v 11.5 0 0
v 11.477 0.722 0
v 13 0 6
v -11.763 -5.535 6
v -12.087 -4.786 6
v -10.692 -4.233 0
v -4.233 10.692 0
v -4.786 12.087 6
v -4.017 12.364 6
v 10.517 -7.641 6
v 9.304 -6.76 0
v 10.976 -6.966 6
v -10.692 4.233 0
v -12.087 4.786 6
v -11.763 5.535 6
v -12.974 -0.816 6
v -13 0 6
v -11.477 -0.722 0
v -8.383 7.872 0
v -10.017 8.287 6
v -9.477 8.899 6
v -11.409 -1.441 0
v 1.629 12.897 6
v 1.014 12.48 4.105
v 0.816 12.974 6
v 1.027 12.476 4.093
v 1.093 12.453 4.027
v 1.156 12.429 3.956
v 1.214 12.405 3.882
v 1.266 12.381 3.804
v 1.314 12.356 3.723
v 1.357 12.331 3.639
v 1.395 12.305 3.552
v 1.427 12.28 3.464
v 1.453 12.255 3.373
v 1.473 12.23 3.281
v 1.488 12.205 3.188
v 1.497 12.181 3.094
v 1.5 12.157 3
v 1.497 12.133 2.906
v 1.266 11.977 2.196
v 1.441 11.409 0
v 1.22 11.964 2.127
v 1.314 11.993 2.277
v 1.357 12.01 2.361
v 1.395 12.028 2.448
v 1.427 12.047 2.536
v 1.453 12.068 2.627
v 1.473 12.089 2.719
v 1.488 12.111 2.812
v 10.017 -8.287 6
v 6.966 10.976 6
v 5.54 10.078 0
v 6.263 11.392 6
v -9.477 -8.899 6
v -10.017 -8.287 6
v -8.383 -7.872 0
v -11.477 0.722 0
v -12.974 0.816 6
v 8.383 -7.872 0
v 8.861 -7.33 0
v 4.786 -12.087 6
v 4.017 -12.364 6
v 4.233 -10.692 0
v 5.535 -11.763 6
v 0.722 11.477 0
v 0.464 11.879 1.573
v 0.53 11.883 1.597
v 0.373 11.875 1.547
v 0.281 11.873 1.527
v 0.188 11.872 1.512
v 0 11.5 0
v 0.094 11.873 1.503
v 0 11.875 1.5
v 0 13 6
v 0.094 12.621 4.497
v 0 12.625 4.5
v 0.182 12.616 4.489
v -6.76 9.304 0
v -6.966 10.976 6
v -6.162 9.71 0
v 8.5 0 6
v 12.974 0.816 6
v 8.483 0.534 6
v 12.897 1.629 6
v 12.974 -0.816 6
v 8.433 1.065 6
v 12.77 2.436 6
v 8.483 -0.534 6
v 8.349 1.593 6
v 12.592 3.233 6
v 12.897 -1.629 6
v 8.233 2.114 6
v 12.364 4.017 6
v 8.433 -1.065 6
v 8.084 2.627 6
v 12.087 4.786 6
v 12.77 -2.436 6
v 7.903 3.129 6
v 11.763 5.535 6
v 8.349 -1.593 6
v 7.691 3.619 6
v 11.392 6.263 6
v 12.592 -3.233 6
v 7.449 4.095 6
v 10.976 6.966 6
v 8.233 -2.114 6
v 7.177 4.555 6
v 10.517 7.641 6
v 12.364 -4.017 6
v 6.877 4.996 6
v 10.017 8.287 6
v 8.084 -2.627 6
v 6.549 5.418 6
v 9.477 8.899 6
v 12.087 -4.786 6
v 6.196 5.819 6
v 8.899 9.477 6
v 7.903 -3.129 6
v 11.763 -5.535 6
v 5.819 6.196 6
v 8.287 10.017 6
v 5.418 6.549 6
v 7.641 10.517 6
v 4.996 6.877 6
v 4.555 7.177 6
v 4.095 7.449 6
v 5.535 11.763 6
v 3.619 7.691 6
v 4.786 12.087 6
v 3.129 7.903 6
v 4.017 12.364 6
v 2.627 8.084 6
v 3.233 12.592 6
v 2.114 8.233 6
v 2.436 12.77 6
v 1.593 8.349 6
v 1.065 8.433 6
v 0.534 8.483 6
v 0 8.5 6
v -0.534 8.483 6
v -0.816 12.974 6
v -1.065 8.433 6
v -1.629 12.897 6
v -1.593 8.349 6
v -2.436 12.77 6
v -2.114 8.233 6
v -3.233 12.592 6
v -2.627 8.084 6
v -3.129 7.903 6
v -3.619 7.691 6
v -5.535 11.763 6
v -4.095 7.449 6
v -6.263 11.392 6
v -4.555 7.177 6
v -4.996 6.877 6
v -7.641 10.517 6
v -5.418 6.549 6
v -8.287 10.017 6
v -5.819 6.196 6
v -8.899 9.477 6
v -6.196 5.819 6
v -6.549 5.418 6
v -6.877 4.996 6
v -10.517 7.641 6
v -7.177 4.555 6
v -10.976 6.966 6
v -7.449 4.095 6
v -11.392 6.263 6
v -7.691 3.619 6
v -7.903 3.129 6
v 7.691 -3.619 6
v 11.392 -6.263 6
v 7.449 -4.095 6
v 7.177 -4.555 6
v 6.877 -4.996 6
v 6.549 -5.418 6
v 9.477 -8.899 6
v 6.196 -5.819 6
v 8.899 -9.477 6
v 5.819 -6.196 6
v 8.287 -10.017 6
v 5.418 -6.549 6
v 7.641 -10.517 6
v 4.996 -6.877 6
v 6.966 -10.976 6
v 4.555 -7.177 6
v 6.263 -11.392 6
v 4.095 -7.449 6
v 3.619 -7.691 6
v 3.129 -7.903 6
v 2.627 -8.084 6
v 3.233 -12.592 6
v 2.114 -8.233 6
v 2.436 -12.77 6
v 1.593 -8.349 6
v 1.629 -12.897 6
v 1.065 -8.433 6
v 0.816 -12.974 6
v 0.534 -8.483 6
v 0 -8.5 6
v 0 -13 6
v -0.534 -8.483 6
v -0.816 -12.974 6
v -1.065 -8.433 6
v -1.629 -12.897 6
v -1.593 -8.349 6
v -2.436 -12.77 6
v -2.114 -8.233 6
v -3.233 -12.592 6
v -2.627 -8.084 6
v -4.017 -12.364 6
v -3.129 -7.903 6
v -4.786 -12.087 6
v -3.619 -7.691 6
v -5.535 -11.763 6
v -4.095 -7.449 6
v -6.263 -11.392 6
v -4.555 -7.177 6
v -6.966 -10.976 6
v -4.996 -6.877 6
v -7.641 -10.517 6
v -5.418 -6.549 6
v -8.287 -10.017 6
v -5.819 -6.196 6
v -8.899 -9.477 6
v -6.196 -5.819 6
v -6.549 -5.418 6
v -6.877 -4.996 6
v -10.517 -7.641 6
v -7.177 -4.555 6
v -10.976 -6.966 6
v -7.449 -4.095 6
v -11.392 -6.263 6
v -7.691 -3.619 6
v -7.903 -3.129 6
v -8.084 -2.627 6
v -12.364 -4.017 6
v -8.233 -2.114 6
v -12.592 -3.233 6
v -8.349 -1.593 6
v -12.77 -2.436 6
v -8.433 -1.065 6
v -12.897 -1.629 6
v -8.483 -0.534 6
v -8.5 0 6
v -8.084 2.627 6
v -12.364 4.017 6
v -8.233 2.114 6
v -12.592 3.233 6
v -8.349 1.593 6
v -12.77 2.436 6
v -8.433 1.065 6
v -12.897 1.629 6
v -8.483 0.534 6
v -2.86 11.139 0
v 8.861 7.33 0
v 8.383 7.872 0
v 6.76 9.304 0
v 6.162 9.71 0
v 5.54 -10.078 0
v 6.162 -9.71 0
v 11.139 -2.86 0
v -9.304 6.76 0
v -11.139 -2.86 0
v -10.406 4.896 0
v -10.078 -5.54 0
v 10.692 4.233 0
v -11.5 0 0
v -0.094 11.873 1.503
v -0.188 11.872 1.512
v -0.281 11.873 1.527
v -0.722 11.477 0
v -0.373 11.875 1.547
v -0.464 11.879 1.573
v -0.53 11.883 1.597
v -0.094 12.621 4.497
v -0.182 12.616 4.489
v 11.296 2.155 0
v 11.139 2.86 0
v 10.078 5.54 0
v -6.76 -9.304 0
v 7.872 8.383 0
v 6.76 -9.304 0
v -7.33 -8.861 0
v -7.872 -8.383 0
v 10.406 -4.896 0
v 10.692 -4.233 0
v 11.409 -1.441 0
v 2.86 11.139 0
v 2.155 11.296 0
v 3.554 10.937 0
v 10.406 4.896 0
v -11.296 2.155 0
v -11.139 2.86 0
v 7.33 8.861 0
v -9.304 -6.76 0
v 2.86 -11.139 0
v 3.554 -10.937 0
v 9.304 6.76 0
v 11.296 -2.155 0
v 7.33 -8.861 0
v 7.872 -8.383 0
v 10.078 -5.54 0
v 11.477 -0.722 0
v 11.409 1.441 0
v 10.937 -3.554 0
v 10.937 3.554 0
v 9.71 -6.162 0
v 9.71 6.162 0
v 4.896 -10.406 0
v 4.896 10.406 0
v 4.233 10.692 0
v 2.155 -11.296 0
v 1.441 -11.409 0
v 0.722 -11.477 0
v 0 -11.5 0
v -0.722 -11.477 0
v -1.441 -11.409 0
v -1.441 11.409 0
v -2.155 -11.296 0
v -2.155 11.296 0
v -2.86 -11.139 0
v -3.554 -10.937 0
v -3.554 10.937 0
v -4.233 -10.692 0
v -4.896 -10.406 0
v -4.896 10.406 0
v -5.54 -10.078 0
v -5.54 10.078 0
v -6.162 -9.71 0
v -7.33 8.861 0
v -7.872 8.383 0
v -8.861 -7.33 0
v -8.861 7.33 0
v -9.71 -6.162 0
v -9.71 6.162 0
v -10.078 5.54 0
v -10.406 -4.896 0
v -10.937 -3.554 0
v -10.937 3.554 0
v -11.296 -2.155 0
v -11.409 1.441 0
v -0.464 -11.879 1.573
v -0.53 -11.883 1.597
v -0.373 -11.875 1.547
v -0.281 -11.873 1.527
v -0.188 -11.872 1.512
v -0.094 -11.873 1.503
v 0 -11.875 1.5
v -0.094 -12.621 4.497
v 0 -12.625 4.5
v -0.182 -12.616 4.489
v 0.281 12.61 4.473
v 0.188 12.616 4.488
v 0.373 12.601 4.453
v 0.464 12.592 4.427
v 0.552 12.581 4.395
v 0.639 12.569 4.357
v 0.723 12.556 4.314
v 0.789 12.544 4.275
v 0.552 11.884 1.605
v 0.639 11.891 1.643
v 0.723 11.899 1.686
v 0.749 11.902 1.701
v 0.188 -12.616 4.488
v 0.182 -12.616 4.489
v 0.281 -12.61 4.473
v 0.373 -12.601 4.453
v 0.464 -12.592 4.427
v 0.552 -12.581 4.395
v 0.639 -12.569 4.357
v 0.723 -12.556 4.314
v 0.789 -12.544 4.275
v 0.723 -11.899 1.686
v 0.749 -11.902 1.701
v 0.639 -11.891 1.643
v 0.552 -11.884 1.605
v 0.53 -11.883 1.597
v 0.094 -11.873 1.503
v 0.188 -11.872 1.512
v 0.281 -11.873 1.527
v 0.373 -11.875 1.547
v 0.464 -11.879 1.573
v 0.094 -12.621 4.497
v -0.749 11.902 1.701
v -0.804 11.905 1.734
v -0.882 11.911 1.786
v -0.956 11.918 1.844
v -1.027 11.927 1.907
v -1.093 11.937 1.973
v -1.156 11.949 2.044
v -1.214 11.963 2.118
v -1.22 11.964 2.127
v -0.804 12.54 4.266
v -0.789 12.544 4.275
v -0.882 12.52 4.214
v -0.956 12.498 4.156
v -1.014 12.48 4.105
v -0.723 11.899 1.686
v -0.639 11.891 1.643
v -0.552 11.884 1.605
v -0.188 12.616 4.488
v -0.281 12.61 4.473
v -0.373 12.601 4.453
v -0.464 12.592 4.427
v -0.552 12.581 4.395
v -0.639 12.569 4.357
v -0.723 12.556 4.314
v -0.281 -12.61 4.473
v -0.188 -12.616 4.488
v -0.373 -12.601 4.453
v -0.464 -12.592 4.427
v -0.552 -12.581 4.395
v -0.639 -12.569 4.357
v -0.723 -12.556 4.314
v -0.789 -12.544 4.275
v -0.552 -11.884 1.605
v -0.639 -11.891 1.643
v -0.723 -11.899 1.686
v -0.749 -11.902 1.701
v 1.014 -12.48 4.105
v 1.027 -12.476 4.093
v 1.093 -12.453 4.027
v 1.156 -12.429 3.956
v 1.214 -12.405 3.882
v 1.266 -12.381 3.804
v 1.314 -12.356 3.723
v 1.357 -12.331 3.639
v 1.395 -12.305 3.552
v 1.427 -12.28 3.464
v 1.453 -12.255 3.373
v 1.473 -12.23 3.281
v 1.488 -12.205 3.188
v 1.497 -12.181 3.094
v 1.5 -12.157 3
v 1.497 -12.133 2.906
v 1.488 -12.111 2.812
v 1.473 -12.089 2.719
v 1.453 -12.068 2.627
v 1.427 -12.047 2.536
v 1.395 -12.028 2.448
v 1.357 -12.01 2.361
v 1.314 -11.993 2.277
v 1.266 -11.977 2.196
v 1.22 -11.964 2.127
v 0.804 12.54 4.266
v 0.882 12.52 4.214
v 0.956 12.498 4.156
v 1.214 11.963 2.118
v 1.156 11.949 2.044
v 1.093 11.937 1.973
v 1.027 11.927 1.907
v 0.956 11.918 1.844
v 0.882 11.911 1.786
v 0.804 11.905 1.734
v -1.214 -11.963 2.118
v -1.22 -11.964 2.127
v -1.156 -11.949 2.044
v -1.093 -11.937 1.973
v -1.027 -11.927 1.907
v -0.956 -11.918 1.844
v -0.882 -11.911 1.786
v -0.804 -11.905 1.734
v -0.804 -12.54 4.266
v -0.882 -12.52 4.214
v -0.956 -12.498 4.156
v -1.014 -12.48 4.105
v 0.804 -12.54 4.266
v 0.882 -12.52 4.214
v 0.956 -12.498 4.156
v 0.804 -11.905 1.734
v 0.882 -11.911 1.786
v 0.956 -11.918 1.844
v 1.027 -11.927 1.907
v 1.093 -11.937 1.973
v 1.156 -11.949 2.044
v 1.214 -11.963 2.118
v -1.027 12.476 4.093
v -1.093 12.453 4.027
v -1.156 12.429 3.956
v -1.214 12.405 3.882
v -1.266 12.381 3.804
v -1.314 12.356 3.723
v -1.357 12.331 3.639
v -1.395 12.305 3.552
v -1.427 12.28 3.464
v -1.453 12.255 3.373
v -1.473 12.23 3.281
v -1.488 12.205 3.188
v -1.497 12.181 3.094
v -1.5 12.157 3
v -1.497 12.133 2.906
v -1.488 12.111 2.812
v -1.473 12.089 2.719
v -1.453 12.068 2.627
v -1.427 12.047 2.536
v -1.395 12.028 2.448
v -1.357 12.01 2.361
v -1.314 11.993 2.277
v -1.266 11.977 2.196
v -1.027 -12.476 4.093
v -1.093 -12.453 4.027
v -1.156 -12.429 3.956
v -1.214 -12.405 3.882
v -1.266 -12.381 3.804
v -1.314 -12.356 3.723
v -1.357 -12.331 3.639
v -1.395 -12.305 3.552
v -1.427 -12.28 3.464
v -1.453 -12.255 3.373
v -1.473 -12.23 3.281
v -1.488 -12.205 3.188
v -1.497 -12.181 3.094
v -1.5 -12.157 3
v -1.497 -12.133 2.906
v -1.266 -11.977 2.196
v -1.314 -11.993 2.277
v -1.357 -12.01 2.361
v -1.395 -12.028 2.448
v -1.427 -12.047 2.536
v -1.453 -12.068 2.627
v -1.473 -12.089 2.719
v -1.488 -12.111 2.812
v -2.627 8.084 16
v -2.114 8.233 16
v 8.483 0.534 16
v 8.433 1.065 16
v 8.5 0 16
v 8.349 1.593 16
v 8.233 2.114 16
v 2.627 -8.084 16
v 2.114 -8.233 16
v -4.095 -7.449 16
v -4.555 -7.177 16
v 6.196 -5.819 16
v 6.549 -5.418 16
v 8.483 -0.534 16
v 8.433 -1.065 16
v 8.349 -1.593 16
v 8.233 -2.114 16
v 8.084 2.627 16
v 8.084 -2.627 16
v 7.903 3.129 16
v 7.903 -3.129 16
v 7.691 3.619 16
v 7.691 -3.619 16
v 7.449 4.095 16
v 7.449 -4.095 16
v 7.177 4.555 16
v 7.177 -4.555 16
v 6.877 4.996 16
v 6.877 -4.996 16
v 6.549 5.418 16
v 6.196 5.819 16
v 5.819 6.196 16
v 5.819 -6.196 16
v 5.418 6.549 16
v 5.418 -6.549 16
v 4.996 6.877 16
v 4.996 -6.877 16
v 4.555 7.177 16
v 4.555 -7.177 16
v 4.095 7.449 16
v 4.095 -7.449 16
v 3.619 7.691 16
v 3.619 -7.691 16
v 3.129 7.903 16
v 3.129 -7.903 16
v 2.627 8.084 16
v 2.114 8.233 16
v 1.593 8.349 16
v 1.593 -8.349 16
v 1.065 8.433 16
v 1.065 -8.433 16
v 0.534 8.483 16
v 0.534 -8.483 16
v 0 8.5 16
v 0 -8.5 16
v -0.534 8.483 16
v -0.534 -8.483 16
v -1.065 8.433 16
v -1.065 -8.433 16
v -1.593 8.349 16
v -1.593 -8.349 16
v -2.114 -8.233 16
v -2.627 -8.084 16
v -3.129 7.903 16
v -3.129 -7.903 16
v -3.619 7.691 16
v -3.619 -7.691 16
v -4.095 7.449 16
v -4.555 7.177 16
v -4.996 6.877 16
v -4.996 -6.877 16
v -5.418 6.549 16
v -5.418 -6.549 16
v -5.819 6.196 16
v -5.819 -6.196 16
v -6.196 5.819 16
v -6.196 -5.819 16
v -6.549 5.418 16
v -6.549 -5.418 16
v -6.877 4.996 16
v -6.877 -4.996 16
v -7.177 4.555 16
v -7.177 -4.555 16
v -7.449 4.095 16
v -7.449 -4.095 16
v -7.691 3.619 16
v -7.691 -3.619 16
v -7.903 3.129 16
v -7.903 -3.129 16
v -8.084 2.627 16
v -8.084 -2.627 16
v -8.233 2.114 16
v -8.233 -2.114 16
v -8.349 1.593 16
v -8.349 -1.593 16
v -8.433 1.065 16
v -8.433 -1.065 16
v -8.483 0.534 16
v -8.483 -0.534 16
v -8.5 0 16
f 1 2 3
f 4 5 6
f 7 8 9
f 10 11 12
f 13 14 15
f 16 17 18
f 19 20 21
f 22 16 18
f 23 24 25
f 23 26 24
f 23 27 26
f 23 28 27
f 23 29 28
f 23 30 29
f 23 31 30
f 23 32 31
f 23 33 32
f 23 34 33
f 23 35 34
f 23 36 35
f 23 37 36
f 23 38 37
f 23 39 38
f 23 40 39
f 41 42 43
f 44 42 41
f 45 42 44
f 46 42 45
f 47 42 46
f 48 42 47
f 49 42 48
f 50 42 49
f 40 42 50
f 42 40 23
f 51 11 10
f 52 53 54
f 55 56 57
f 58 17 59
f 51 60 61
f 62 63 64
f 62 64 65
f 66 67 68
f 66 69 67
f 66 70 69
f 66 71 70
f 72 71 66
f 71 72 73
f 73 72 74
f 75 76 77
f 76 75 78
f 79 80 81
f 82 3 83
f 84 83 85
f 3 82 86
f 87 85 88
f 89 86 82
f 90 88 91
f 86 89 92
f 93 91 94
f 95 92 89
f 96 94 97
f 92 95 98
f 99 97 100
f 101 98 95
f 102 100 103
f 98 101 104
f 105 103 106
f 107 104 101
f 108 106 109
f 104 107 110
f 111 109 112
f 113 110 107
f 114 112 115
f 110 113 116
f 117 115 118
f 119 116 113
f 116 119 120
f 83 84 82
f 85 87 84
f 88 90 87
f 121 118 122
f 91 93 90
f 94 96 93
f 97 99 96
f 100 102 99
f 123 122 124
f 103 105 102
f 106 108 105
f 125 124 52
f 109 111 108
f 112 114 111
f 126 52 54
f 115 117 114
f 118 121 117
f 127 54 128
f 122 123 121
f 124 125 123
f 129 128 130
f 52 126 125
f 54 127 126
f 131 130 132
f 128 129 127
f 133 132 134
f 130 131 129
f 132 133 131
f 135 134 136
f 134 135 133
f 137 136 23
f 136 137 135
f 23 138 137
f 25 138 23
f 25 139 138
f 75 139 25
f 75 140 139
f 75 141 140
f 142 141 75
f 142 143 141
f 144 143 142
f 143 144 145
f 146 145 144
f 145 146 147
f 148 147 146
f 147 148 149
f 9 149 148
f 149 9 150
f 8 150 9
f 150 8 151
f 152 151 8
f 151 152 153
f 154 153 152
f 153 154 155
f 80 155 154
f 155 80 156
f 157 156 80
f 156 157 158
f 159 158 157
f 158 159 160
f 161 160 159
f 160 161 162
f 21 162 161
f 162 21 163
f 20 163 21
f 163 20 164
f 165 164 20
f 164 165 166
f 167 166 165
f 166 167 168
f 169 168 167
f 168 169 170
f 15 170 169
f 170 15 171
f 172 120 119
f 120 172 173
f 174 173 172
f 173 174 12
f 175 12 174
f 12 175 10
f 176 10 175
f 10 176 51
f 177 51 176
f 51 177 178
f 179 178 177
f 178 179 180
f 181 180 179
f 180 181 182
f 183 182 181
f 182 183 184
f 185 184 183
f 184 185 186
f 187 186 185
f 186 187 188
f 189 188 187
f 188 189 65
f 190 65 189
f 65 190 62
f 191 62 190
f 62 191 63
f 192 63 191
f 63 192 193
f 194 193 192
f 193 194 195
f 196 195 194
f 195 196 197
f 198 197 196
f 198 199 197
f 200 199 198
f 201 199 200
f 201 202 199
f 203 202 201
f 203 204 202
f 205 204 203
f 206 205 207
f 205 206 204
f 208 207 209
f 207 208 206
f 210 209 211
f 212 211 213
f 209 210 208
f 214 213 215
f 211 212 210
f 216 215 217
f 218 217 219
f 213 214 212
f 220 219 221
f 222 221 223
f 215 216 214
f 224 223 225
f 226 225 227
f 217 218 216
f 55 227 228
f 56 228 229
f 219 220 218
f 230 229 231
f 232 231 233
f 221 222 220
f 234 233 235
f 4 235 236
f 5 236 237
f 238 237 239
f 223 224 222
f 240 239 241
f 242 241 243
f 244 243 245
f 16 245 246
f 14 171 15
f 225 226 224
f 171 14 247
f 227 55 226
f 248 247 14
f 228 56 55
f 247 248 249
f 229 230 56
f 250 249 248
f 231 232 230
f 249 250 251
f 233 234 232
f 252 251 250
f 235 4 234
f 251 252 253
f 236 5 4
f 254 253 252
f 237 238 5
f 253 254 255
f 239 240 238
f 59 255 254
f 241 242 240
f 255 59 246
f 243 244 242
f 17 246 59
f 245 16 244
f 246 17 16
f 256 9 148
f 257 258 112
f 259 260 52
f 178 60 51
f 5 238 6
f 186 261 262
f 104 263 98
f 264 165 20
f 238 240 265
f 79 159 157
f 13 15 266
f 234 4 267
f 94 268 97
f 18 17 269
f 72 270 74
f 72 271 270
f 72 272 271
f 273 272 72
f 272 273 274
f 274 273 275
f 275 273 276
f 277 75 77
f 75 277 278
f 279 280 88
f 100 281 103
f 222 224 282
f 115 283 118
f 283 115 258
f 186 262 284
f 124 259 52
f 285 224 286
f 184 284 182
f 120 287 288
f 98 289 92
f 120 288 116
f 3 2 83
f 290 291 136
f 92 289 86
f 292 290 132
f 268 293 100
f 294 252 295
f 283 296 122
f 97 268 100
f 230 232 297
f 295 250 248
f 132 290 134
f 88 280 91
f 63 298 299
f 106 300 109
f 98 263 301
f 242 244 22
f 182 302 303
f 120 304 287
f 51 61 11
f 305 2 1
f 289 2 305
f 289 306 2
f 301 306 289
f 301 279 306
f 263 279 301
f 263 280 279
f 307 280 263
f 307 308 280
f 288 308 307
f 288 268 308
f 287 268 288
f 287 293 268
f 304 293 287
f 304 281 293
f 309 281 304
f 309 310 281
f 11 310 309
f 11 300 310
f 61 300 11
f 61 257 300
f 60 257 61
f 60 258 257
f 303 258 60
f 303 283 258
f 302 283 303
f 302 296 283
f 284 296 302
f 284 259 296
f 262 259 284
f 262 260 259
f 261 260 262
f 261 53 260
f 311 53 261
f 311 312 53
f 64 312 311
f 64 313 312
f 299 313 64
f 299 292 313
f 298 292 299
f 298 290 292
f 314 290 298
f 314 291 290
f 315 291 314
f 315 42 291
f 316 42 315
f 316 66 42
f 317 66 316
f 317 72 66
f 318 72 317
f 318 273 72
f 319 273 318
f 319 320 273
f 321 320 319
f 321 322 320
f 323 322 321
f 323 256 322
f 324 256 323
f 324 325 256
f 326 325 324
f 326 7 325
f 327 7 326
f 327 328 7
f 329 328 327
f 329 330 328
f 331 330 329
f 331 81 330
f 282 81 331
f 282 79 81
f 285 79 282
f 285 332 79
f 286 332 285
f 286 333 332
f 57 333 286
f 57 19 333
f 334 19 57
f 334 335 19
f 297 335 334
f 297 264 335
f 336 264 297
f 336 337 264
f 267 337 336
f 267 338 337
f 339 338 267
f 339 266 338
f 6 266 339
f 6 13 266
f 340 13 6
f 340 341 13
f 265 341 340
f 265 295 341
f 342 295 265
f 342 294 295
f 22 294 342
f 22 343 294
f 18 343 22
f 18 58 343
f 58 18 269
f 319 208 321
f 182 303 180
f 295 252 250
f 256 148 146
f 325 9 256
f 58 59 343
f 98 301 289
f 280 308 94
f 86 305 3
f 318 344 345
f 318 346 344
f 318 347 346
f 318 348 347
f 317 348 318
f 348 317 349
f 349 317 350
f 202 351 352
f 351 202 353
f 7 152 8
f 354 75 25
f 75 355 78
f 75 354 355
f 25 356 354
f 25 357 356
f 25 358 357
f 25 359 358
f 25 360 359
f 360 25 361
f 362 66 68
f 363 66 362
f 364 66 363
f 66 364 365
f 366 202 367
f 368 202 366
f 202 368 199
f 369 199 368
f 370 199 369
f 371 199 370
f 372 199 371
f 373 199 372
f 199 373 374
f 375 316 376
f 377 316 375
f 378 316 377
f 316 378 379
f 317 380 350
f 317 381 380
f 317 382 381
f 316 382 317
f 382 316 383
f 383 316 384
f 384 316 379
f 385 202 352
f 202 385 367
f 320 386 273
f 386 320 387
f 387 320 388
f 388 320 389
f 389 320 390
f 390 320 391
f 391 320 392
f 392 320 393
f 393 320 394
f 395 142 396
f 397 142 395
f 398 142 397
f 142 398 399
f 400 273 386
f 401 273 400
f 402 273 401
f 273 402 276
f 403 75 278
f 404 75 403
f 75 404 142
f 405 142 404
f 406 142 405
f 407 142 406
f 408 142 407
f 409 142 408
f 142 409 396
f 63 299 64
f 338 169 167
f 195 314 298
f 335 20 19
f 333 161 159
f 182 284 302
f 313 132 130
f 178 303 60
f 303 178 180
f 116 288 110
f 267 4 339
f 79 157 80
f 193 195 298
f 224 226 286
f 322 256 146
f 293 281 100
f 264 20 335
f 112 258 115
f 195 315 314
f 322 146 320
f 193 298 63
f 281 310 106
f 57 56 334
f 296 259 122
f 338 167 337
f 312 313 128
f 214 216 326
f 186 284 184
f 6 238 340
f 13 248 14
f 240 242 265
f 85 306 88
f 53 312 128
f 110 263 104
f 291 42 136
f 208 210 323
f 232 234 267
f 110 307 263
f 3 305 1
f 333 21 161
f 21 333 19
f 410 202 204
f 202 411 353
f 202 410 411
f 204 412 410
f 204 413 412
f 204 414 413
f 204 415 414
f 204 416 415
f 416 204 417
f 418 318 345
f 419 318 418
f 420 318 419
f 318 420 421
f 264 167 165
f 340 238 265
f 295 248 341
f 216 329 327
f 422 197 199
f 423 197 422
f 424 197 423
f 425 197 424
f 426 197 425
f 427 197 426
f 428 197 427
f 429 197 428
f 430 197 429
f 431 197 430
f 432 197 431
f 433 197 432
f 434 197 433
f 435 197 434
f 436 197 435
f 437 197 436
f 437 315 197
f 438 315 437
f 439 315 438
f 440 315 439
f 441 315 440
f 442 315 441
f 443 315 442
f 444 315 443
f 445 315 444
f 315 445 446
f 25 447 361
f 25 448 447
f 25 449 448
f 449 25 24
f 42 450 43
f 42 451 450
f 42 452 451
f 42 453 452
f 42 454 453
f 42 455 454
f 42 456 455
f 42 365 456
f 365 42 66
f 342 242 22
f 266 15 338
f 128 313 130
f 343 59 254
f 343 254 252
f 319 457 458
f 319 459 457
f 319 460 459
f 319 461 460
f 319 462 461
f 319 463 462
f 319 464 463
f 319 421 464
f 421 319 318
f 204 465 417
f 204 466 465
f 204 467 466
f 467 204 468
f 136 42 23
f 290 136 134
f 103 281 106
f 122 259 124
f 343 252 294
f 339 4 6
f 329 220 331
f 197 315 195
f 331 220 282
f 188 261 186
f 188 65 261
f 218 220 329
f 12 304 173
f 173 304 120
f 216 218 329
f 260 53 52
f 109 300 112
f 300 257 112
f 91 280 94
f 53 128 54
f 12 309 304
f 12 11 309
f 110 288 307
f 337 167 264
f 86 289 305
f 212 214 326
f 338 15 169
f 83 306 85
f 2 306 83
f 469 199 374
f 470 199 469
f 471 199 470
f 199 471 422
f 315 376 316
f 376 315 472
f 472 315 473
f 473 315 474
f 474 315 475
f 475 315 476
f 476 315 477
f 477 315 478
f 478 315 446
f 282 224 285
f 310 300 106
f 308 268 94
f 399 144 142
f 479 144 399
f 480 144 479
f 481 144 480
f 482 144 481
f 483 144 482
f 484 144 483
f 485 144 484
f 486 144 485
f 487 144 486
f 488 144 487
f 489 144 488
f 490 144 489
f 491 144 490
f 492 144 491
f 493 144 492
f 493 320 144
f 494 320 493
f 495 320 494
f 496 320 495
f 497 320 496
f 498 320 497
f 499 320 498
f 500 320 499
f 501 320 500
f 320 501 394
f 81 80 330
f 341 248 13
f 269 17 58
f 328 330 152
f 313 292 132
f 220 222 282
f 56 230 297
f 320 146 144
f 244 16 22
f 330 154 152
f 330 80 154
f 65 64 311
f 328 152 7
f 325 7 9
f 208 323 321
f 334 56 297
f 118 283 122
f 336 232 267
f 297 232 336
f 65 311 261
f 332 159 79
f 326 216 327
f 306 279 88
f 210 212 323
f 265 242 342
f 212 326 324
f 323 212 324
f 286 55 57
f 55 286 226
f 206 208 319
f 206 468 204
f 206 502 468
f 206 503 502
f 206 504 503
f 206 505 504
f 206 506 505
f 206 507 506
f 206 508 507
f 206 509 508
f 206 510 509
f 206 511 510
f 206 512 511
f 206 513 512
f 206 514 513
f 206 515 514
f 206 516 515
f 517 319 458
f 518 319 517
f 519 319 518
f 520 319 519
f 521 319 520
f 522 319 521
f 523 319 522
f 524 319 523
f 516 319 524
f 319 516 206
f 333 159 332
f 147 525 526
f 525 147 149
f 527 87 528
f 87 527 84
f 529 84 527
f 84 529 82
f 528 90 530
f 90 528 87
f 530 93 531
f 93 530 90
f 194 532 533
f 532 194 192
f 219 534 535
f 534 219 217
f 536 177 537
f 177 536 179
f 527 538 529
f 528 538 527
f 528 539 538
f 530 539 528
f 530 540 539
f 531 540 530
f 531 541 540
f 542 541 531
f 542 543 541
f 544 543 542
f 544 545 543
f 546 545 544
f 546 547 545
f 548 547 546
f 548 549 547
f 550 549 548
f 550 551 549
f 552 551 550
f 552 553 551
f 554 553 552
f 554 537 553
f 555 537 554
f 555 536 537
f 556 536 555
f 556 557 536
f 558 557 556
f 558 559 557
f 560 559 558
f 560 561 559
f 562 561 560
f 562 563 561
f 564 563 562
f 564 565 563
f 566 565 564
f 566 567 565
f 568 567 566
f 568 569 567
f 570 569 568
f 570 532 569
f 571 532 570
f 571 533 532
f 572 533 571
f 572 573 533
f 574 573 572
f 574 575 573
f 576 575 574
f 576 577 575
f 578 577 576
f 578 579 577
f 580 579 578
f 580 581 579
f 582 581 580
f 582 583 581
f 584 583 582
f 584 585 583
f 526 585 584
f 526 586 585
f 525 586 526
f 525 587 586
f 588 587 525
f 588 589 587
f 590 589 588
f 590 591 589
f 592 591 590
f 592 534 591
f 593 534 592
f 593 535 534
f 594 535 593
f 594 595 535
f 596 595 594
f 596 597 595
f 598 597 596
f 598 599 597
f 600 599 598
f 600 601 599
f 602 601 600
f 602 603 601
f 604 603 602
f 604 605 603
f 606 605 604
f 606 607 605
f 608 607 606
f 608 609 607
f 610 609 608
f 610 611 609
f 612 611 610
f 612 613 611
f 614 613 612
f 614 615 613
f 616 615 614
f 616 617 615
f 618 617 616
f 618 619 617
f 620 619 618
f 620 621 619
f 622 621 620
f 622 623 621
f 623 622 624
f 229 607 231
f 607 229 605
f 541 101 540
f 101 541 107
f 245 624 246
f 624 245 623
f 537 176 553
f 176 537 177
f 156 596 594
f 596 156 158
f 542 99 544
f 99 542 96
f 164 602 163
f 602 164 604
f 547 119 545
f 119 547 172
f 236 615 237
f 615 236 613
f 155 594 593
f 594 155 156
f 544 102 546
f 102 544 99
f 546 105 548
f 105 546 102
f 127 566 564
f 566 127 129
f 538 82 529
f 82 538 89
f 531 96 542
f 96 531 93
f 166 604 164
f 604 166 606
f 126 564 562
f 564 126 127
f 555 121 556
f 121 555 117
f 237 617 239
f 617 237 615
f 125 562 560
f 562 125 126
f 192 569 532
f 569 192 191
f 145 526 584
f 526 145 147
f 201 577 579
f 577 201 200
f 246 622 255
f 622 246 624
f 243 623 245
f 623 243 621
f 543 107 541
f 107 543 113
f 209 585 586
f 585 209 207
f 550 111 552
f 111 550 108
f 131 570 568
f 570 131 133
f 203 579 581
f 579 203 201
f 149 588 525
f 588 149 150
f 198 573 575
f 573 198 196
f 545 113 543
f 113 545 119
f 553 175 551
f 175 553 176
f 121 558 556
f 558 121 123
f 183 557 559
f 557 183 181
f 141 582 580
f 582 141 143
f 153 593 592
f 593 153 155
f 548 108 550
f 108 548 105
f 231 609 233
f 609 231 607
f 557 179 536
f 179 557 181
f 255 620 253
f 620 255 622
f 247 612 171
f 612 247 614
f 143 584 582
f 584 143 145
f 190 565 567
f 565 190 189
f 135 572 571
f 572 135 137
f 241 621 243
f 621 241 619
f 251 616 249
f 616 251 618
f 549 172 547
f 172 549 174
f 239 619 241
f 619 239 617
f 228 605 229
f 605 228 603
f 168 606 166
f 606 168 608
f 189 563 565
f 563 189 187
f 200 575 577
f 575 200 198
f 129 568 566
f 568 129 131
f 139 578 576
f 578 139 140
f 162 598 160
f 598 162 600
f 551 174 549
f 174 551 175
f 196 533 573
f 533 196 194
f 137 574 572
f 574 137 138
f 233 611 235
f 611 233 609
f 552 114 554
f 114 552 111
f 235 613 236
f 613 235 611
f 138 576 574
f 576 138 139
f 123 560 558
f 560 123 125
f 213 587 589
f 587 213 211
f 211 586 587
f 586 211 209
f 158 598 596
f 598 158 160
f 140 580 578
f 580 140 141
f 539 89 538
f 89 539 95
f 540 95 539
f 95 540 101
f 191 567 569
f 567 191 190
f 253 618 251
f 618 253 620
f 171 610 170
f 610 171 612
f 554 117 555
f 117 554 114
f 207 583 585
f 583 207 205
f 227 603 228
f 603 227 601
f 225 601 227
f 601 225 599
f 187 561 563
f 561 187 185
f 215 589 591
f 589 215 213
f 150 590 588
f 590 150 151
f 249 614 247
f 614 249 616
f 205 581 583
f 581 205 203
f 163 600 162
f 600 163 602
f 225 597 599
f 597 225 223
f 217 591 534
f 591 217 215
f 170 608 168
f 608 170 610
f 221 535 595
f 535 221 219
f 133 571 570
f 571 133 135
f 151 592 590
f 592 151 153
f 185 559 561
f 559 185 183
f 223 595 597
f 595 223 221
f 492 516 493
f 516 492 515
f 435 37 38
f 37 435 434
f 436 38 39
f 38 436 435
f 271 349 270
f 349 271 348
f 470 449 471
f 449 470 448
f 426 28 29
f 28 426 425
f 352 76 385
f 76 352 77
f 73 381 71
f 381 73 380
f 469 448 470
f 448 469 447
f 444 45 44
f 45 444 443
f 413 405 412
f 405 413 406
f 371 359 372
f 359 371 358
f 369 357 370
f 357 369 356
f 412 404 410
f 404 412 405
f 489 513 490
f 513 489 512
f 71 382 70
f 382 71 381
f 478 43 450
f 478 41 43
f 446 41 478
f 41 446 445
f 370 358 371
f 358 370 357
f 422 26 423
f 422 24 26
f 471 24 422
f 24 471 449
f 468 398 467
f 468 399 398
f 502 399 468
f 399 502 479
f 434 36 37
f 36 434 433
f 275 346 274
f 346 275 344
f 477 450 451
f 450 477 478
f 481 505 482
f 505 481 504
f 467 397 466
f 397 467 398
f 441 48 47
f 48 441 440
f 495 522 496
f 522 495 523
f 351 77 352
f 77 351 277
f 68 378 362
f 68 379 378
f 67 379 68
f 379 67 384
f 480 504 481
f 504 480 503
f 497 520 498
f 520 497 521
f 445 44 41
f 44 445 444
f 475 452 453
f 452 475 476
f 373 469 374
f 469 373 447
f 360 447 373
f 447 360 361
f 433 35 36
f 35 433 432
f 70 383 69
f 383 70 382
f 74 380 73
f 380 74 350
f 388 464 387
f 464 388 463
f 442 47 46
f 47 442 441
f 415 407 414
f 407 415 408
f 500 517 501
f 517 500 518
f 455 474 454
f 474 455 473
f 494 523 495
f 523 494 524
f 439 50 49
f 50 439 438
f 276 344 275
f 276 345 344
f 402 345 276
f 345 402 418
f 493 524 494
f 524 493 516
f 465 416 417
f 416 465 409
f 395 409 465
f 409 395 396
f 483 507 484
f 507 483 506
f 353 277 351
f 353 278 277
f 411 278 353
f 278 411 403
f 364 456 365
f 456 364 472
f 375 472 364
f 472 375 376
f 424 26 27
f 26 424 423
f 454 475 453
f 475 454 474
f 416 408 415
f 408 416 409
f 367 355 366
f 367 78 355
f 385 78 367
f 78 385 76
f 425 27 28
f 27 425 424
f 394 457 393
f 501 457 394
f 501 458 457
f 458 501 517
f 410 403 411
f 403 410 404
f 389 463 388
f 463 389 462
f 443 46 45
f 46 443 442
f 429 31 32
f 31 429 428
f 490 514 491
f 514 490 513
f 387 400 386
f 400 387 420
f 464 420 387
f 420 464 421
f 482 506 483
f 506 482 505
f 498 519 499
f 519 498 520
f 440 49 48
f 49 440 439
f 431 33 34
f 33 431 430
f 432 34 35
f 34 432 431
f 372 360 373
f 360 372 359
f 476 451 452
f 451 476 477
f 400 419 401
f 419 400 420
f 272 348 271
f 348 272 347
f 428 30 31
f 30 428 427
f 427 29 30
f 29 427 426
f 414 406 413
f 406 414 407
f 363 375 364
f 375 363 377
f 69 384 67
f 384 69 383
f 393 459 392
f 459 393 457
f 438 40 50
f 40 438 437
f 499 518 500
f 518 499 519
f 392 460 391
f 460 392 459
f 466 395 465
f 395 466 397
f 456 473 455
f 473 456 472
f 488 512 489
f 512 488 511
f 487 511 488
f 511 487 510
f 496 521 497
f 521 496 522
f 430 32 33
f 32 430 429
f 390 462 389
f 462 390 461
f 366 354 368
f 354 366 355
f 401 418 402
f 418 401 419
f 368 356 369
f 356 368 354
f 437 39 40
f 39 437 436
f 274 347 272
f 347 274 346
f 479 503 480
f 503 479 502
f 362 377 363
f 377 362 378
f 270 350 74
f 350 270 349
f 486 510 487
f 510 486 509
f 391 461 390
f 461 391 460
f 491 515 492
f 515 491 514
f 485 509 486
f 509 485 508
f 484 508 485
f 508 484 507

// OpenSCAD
INTERNAL_DIA = 17;
INTERNAL_HEIGHT = 10;

EXTERNAL_DIA_TOP = 23;
EXTERNAL_DIA_BOT = 26;
EXTERNAL_HEIGHT = 6;

CLAMP_HOLE_DIA = 3;

$fn = 100;

difference() {
    union() {
        cylinder(d2 = EXTERNAL_DIA_BOT, d1 = EXTERNAL_DIA_TOP, h = EXTERNAL_HEIGHT);
        cylinder(d = INTERNAL_DIA, h = EXTERNAL_HEIGHT + INTERNAL_HEIGHT);
    }
    
    translate([0, 0, EXTERNAL_HEIGHT/2])
    rotate([90, 0, 0])
    cylinder(d = CLAMP_HOLE_DIA, h = max(EXTERNAL_DIA_TOP, EXTERNAL_DIA_BOT), center = true);
}
